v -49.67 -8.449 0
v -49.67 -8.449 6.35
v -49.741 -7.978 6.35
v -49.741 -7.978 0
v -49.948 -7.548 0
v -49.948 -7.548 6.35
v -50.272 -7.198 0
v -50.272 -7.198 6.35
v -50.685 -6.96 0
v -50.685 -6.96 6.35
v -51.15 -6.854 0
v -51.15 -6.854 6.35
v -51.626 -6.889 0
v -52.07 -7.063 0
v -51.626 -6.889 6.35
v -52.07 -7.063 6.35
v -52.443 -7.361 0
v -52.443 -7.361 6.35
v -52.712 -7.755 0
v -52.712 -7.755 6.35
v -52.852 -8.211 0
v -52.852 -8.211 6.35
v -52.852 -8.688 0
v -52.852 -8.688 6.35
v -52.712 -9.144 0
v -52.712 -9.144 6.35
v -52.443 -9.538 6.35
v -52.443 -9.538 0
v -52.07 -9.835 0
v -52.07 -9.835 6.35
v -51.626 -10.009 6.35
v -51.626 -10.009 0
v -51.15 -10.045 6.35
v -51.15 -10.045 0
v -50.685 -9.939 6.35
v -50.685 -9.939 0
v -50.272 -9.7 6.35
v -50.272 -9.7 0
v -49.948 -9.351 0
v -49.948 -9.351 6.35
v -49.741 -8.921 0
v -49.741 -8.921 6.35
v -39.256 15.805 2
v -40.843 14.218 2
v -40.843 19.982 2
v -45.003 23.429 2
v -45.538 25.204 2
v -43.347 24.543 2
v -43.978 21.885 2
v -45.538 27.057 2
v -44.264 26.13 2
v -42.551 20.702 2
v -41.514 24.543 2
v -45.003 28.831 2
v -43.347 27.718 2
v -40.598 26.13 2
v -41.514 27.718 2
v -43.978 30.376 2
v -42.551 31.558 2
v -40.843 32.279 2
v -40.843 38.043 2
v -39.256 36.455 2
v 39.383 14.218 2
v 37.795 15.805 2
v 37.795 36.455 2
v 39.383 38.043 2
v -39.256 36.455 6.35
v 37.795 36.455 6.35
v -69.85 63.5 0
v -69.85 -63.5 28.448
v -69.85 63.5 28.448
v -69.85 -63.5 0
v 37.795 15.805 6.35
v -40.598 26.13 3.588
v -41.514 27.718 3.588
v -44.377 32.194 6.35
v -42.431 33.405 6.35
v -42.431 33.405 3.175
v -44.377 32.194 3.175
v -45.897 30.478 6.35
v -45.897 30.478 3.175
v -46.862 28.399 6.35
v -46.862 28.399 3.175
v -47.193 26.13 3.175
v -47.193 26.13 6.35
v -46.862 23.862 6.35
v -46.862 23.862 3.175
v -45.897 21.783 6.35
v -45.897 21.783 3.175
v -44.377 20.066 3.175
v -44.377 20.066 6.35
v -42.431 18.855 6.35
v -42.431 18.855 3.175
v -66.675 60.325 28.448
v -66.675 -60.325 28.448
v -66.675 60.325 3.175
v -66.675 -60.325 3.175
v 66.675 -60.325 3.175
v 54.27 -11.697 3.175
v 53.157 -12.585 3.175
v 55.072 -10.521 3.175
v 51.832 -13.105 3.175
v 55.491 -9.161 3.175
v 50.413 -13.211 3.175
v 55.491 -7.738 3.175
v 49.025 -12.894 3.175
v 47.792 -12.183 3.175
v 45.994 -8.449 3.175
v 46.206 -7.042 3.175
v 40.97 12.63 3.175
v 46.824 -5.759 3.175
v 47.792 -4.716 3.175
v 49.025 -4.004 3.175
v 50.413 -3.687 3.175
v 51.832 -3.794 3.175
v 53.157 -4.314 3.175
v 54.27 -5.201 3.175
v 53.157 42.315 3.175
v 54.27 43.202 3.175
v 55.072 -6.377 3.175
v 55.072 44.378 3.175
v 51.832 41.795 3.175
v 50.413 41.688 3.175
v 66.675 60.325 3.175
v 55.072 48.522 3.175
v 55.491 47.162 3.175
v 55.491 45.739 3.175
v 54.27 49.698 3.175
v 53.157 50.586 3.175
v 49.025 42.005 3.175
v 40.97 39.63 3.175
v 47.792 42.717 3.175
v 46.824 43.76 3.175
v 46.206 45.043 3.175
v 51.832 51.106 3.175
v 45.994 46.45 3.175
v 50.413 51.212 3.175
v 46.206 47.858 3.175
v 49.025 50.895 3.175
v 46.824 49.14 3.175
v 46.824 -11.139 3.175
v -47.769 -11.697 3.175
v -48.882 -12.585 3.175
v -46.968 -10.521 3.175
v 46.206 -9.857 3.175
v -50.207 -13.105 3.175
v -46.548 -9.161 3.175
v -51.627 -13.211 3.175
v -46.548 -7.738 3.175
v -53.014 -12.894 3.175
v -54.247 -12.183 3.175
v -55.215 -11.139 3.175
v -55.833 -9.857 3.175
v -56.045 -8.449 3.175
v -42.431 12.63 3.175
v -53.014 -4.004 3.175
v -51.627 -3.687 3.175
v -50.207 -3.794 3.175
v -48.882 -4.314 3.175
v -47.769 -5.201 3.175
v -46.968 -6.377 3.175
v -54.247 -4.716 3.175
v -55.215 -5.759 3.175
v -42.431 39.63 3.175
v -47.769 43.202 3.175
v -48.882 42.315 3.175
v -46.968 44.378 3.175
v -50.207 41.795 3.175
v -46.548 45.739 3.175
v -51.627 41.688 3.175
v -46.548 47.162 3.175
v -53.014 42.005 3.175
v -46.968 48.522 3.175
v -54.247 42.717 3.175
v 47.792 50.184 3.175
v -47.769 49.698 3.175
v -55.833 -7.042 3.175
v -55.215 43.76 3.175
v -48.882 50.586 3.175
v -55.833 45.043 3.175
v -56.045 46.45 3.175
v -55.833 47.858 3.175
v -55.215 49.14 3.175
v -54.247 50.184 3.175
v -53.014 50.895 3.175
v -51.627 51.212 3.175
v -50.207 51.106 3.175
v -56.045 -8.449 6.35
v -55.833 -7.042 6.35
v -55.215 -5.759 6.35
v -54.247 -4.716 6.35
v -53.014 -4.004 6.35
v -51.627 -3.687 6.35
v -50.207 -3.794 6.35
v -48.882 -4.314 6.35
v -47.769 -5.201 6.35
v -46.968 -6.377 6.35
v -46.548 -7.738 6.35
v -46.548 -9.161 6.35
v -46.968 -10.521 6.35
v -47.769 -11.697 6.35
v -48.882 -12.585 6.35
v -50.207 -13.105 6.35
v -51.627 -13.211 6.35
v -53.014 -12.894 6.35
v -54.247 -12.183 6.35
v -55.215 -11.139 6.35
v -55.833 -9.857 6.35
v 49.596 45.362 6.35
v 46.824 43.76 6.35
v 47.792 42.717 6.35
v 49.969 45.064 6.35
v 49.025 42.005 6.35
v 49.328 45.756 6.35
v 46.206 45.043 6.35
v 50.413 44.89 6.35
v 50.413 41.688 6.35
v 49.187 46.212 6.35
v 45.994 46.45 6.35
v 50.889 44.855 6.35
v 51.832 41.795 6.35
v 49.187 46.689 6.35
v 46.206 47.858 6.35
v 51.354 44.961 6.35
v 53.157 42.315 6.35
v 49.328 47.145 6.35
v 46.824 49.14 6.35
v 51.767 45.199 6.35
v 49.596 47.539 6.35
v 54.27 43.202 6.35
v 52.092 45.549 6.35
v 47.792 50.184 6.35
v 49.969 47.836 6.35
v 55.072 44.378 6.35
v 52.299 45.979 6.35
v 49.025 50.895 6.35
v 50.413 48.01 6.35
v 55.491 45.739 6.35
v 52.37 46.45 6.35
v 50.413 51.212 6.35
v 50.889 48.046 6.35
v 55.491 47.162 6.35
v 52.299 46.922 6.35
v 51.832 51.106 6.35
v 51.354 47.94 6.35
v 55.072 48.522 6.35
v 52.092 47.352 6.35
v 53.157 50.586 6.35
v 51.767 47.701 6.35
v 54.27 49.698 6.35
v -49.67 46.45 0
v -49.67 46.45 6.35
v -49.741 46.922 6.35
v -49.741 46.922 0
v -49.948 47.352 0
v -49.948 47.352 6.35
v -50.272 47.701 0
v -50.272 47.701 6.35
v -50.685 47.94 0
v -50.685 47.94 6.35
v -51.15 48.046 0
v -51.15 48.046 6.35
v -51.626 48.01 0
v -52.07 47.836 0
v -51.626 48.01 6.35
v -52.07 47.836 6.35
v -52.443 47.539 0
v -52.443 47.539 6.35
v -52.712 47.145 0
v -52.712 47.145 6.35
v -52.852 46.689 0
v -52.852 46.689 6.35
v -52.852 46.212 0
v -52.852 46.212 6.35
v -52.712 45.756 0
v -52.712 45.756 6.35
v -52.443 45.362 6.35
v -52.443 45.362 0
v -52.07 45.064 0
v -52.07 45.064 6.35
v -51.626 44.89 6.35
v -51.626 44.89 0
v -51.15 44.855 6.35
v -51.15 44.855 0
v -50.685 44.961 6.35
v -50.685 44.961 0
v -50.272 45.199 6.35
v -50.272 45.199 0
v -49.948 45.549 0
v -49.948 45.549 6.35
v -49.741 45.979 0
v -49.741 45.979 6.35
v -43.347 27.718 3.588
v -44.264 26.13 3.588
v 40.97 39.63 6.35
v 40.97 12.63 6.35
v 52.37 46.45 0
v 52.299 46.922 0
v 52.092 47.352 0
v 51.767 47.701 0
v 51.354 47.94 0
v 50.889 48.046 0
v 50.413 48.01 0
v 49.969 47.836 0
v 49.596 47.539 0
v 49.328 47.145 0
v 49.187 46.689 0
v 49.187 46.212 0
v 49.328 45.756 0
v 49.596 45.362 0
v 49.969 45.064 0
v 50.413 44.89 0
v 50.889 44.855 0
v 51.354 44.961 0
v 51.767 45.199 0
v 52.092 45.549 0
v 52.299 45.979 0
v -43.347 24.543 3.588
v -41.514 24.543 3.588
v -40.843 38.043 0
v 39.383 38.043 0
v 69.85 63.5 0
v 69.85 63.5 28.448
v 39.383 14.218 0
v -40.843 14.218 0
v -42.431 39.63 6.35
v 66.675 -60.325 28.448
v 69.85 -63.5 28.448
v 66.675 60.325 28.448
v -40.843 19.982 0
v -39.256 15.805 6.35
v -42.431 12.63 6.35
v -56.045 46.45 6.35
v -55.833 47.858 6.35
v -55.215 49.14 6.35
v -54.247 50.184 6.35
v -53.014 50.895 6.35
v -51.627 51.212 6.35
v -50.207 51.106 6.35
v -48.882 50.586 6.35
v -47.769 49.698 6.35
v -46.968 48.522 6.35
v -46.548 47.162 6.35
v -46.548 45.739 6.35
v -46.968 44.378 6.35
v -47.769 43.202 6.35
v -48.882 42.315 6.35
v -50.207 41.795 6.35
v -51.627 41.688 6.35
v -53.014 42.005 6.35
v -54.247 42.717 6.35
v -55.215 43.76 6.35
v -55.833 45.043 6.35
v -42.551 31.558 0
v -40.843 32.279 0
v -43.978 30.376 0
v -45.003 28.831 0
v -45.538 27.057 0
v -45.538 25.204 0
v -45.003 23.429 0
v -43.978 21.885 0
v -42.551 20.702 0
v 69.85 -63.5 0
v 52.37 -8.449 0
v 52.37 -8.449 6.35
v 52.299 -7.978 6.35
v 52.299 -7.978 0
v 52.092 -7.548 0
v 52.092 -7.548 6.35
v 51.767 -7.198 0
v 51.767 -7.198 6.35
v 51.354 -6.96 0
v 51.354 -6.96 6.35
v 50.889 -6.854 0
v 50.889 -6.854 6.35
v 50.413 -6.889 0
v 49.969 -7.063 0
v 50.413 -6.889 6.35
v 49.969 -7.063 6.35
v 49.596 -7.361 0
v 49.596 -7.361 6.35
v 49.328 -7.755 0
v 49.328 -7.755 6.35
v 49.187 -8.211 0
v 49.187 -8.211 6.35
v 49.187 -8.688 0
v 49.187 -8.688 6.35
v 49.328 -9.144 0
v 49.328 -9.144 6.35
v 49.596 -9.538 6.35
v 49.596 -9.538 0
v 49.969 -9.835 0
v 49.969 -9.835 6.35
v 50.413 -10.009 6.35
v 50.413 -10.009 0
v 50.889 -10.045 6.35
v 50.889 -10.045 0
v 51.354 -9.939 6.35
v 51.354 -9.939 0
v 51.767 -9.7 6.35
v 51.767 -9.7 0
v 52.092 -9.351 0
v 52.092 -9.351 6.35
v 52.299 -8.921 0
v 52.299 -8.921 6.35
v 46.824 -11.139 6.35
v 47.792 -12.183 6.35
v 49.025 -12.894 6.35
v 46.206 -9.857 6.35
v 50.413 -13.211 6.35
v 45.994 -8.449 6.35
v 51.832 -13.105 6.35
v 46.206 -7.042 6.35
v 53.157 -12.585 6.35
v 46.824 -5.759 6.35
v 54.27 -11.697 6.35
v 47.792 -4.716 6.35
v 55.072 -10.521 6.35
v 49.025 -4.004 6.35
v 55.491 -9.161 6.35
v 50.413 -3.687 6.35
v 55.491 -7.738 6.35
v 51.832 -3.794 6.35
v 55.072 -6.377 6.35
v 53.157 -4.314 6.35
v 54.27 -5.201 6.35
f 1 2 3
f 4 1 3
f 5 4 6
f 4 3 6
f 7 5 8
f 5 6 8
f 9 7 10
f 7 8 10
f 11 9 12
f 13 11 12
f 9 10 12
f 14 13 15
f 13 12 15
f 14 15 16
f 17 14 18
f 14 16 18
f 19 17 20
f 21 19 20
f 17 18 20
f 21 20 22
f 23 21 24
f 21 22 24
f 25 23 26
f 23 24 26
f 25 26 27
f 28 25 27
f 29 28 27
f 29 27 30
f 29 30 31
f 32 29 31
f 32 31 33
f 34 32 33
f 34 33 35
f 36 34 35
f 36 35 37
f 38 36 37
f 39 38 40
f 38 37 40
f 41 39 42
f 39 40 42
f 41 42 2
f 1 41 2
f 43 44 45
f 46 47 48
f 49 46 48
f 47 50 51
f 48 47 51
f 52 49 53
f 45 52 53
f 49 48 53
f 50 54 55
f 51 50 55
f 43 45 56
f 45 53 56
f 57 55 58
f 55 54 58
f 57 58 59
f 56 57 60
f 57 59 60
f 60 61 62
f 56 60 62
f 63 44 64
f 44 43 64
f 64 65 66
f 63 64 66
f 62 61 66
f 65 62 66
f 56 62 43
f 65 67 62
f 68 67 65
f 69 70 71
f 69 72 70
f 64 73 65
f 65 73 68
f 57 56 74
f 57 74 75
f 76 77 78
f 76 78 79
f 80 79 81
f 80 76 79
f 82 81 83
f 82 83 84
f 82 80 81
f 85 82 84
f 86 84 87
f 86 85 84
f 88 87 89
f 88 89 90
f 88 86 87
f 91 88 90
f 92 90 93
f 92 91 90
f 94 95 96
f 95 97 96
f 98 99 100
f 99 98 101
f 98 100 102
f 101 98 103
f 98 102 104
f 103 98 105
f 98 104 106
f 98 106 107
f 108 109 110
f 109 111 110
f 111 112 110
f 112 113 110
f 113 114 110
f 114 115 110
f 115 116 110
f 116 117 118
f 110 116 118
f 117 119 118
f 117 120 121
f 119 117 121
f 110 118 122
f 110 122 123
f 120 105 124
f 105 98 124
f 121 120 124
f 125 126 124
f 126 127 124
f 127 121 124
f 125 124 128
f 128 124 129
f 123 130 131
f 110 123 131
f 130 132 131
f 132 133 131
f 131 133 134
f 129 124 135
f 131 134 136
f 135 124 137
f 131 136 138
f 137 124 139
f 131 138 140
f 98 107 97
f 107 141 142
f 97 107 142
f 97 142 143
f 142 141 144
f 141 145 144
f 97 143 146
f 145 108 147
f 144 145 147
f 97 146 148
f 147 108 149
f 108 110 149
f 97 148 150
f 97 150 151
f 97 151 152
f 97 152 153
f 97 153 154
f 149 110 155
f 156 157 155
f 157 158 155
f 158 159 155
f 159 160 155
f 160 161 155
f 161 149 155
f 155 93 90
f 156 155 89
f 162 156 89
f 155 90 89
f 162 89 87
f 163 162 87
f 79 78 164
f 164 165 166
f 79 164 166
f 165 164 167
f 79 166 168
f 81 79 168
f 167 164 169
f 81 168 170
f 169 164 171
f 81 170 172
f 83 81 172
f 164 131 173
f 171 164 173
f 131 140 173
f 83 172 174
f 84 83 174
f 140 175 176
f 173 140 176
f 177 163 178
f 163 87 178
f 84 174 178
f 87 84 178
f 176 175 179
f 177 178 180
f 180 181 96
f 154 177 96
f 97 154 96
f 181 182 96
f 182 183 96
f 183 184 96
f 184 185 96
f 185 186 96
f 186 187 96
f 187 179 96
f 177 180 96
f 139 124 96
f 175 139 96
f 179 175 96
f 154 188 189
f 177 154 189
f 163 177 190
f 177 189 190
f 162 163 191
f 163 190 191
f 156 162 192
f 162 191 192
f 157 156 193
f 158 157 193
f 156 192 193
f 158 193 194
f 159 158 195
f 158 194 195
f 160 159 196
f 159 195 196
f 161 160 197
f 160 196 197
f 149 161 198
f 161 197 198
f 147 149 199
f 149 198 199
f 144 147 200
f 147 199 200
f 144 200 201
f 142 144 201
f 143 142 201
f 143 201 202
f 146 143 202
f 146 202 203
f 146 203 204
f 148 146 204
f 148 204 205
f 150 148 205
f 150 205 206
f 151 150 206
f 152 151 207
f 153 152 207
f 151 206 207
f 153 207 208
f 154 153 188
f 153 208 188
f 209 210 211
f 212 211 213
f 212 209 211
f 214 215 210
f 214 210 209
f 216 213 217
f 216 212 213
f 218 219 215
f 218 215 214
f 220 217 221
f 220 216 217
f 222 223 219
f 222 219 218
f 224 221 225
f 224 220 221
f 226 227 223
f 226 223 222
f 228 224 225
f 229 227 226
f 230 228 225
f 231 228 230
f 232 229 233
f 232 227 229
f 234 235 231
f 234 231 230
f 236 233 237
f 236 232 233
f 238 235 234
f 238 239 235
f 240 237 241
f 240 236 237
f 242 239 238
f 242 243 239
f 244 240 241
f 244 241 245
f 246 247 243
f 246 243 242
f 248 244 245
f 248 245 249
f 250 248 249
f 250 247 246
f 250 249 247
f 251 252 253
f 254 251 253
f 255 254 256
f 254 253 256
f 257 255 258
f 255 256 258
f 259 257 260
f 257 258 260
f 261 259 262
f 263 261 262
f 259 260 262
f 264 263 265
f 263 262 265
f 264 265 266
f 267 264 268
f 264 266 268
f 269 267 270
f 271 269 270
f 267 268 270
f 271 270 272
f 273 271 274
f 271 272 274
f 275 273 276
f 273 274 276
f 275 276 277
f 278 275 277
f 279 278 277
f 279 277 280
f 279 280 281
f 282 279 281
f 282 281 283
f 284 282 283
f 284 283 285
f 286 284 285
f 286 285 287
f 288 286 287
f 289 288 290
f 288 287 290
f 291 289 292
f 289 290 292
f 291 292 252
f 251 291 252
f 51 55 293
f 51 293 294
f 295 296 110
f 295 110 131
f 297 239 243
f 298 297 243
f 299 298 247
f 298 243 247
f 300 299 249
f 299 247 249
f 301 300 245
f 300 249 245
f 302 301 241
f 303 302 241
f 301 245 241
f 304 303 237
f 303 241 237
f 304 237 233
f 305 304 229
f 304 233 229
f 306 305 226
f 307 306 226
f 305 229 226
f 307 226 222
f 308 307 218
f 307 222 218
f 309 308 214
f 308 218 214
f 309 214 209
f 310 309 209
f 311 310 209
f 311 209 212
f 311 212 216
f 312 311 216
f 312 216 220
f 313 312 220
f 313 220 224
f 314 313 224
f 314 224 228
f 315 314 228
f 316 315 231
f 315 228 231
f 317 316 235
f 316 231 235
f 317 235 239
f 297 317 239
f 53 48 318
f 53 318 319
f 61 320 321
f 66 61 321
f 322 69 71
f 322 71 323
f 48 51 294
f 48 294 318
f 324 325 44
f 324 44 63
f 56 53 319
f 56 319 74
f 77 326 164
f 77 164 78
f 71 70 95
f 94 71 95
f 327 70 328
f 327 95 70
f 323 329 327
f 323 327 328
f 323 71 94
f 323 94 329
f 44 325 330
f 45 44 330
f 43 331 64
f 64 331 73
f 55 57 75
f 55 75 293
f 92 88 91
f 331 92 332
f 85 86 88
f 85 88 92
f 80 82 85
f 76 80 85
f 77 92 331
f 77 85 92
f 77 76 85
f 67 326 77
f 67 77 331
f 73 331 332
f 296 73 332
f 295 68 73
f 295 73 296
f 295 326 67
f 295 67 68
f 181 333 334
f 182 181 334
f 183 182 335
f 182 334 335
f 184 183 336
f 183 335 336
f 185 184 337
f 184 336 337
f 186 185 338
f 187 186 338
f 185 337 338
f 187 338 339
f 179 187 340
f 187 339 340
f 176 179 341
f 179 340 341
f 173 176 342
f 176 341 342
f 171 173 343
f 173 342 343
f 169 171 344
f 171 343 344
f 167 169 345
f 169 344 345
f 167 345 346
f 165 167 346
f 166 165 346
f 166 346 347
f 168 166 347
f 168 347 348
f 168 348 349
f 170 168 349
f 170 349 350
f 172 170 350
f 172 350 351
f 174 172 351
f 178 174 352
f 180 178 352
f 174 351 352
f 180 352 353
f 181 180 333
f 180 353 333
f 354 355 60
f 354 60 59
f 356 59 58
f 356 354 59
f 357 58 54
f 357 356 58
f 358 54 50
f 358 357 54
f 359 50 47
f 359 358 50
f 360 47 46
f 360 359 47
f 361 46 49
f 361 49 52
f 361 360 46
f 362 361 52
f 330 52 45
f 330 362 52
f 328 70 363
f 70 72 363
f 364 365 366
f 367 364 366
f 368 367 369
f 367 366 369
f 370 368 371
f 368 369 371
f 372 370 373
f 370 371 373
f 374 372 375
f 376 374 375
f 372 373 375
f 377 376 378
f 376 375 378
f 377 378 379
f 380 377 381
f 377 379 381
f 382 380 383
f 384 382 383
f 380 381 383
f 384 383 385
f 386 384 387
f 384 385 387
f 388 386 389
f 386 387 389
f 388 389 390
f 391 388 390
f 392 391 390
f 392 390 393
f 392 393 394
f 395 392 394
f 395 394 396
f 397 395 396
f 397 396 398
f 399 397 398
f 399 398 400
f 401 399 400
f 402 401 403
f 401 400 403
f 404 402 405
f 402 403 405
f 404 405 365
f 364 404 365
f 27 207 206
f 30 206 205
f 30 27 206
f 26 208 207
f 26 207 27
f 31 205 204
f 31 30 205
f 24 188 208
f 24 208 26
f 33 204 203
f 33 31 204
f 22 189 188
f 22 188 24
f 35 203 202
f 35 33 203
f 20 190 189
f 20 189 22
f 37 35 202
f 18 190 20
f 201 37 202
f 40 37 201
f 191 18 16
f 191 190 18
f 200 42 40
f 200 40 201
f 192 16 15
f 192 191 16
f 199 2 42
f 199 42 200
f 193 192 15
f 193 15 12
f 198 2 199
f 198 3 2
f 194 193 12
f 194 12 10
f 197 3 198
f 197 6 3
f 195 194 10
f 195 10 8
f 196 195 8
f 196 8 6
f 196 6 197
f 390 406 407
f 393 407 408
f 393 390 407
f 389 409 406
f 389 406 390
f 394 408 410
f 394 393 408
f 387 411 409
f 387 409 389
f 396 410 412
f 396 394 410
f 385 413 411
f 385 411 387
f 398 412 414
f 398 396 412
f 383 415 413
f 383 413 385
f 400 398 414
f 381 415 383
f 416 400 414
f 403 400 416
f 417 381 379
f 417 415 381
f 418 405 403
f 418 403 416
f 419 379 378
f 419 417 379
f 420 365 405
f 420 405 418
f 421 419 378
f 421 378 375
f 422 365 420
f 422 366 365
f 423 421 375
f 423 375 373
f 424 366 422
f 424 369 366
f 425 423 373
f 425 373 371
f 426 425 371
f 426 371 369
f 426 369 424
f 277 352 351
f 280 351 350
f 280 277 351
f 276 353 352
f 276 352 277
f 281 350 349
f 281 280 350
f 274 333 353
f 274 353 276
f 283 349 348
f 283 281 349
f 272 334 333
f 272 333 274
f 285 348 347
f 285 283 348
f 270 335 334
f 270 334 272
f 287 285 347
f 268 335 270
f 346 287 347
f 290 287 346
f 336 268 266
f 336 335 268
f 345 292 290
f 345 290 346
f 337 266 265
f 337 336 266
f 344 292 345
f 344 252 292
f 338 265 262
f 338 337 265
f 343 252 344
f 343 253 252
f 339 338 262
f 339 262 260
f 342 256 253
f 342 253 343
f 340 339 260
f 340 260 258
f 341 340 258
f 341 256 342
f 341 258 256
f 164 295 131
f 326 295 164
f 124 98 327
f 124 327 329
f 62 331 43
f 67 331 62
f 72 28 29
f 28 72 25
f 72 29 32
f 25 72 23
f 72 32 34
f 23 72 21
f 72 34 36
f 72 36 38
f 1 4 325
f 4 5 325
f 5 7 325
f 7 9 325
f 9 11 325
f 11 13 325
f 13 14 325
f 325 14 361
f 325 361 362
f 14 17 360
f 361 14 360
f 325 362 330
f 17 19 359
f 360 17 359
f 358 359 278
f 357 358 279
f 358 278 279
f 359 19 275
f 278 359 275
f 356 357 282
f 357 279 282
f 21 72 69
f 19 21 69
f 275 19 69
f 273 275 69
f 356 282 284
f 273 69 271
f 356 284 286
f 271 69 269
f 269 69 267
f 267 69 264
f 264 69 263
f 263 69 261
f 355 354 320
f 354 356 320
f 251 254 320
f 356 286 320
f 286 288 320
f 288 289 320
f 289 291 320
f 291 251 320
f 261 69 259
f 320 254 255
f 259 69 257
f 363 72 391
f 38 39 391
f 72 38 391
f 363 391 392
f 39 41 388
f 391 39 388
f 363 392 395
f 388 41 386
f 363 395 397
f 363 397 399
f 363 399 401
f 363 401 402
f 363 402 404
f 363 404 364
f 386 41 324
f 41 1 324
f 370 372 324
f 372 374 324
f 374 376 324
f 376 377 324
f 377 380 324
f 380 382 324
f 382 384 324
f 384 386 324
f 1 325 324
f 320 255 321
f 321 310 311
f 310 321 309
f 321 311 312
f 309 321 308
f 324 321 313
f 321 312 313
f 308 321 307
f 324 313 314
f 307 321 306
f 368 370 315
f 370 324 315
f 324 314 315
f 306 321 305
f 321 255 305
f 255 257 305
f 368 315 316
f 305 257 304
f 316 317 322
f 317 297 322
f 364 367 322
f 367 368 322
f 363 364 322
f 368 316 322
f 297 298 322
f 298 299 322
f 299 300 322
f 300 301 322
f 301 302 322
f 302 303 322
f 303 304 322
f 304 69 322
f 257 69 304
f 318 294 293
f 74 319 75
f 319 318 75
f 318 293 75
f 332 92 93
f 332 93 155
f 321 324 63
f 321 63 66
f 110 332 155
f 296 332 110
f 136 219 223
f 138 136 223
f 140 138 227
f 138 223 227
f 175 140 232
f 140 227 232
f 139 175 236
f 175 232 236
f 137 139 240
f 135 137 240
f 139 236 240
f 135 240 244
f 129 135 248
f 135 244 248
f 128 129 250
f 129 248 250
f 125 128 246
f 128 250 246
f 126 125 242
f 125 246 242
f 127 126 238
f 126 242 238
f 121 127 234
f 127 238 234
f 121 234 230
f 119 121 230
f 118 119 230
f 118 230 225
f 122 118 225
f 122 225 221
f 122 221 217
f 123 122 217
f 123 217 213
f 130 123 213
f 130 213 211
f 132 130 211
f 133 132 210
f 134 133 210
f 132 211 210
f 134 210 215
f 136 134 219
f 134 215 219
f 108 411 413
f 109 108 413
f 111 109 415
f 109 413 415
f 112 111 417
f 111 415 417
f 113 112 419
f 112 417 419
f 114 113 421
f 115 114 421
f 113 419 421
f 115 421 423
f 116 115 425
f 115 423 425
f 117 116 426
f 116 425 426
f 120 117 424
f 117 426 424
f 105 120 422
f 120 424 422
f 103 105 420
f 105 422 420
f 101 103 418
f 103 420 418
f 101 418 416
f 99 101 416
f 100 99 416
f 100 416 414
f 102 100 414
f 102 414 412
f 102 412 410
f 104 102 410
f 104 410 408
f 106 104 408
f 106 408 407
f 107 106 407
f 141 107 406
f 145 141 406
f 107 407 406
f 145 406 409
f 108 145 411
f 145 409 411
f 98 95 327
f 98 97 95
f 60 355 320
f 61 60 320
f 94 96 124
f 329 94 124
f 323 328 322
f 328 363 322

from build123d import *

# Parameters (mm, degrees)
SKETCH1_W                  = 139.7
SKETCH1_H                  = 127
PLATE_WIDTH_DEPTH          = 6.35
SKETCH2_R                  = 1.6002
SKETCH2_W                  = 77.0509
SKETCH2_H                  = 20.6502
THROUGH_HOLES_DEPTH        = 6.35
SKETCH3_R                  = 6.35
SKETCH3_W                  = 80.2259
SKETCH3_H                  = 23.8252
SKETCH3_W_2                = 77.0509
SKETCH3_H_2                = 20.6502
COVER_CUTOUT_DEPTH         = 2
NUT_INSET_DEPTH            = 1.5875
MATERIAL_REMOVAL_OUTLINE_W = 133.35
MATERIAL_REMOVAL_OUTLINE_H = 120.65
MATERIAL_REMOVAL_OUTLINE_R = 4.7752
MATERIAL_REMOVAL_DEPTH     = 3.175
SKETCH6_W                  = 139.7
SKETCH6_H                  = 127
SKETCH6_W_2                = 133.35
SKETCH6_H_2                = 120.65
BOSS_EXTRUDE1_DEPTH        = 22.098


# Read off the part's stored shape, not the designer's step: Material Removal
with BuildPart() as part:
    # Sketch1 → Plate Width (new body)
    with BuildSketch(Plane.XY):
        Rectangle(SKETCH1_W, SKETCH1_H)
    extrude(amount=PLATE_WIDTH_DEPTH)

    # Sketch2 → Through Holes (cut)
    with BuildSketch(Plane.XY.offset(6.35)):
        with Locations((-51.2699, 46.45025)):
            Circle(SKETCH2_R)
        with Locations((-51.2699, -8.44931)):
            Circle(SKETCH2_R)
        with Locations((50.76952, -8.44931)):
            Circle(SKETCH2_R)
        with Locations((50.76952, 46.45025)):
            Circle(SKETCH2_R)
        with Locations((-0.73025, 26.13025)):
            Rectangle(SKETCH2_W, SKETCH2_H)
    extrude(amount=-THROUGH_HOLES_DEPTH, mode=Mode.SUBTRACT)

    # Sketch3 → Cover Cutout (cut)
    # profile 1 of 4: a face of its own
    with BuildSketch(Plane.XY):
        with Locations((-39.2557, 26.13025)):
            Circle(SKETCH3_R)
    # profile 2 of 4: a face of its own
    with BuildSketch(Plane.XY):
        with Locations((-0.73025, 26.13025)):
            Rectangle(SKETCH3_W, SKETCH3_H)
        with Locations((-0.73025, 26.13025)):
            Rectangle(SKETCH3_W_2, SKETCH3_H_2, mode=Mode.SUBTRACT)
    # profile 3 of 4: a face of its own
    with BuildSketch(Plane.XY):
        with BuildLine():
            Line((-40.8432, 19.981888938), (-40.8432, 32.278611062))
            ThreePointArc((-40.8432, 32.278611062), (-45.6057, 26.13025), (-40.8432, 19.981888938))
        make_face()
    # profile 4 of 4: a face of its own
    with BuildSketch(Plane.XY):
        with BuildLine():
            Line((-39.2557, 19.78025), (-39.2557, 32.48025))
            ThreePointArc((-39.2557, 32.48025), (-40.055827257, 32.429638571), (-40.8432, 32.278611062))
            Line((-40.8432, 32.278611062), (-40.8432, 19.981888938))
            ThreePointArc((-40.8432, 19.981888938), (-40.055827257, 19.830861429), (-39.2557, 19.78025))
        make_face()
    extrude(amount=COVER_CUTOUT_DEPTH, mode=Mode.SUBTRACT)

    # Sketch4 → Nut Inset (cut)
    with BuildSketch(Plane.XY.offset(2)):
        Polygon((-41.514156448, 24.54275), (-40.597612895, 26.13025), (-41.514156448, 27.71775), (-43.347243552, 27.71775), (-44.263787105, 26.13025), (-43.347243552, 24.54275), align=None)
    extrude(amount=NUT_INSET_DEPTH, mode=Mode.SUBTRACT)

    # Material Removal outline → Material Removal (cut)
    with BuildSketch(Plane(origin=(0, 0, 6.35), x_dir=(-1, 0, 0), z_dir=(0, 0, -1))):
        Rectangle(MATERIAL_REMOVAL_OUTLINE_W, MATERIAL_REMOVAL_OUTLINE_H)
        with Locations((-50.76952, -8.44931)):
            Circle(MATERIAL_REMOVAL_OUTLINE_R, mode=Mode.SUBTRACT)
        with Locations((51.2699, -8.44931)):
            Circle(MATERIAL_REMOVAL_OUTLINE_R, mode=Mode.SUBTRACT)
        with Locations((-50.76952, 46.45025)):
            Circle(MATERIAL_REMOVAL_OUTLINE_R, mode=Mode.SUBTRACT)
        with BuildLine():
            Line((42.4307, 39.63035), (42.4307, 33.405088916))
            ThreePointArc((42.4307, 33.405088916), (47.1932, 26.13025), (42.4307, 18.855411084))
            Line((42.4307, 18.855411084), (42.4307, 12.63015))
            Line((42.4307, 12.63015), (-40.9702, 12.63015))
            Line((-40.9702, 12.63015), (-40.9702, 39.63035))
            Line((-40.9702, 39.63035), (42.4307, 39.63035))
        make_face(mode=Mode.SUBTRACT)
        with Locations((51.2699, 46.45025)):
            Circle(MATERIAL_REMOVAL_OUTLINE_R, mode=Mode.SUBTRACT)
    extrude(amount=MATERIAL_REMOVAL_DEPTH, mode=Mode.SUBTRACT)

    # Sketch6 → Boss-Extrude1 (add)
    with BuildSketch(Plane.XY.offset(6.35)):
        Rectangle(SKETCH6_W, SKETCH6_H)
        Rectangle(SKETCH6_W_2, SKETCH6_H_2, mode=Mode.SUBTRACT)
    extrude(amount=BOSS_EXTRUDE1_DEPTH)


solid = part.part
